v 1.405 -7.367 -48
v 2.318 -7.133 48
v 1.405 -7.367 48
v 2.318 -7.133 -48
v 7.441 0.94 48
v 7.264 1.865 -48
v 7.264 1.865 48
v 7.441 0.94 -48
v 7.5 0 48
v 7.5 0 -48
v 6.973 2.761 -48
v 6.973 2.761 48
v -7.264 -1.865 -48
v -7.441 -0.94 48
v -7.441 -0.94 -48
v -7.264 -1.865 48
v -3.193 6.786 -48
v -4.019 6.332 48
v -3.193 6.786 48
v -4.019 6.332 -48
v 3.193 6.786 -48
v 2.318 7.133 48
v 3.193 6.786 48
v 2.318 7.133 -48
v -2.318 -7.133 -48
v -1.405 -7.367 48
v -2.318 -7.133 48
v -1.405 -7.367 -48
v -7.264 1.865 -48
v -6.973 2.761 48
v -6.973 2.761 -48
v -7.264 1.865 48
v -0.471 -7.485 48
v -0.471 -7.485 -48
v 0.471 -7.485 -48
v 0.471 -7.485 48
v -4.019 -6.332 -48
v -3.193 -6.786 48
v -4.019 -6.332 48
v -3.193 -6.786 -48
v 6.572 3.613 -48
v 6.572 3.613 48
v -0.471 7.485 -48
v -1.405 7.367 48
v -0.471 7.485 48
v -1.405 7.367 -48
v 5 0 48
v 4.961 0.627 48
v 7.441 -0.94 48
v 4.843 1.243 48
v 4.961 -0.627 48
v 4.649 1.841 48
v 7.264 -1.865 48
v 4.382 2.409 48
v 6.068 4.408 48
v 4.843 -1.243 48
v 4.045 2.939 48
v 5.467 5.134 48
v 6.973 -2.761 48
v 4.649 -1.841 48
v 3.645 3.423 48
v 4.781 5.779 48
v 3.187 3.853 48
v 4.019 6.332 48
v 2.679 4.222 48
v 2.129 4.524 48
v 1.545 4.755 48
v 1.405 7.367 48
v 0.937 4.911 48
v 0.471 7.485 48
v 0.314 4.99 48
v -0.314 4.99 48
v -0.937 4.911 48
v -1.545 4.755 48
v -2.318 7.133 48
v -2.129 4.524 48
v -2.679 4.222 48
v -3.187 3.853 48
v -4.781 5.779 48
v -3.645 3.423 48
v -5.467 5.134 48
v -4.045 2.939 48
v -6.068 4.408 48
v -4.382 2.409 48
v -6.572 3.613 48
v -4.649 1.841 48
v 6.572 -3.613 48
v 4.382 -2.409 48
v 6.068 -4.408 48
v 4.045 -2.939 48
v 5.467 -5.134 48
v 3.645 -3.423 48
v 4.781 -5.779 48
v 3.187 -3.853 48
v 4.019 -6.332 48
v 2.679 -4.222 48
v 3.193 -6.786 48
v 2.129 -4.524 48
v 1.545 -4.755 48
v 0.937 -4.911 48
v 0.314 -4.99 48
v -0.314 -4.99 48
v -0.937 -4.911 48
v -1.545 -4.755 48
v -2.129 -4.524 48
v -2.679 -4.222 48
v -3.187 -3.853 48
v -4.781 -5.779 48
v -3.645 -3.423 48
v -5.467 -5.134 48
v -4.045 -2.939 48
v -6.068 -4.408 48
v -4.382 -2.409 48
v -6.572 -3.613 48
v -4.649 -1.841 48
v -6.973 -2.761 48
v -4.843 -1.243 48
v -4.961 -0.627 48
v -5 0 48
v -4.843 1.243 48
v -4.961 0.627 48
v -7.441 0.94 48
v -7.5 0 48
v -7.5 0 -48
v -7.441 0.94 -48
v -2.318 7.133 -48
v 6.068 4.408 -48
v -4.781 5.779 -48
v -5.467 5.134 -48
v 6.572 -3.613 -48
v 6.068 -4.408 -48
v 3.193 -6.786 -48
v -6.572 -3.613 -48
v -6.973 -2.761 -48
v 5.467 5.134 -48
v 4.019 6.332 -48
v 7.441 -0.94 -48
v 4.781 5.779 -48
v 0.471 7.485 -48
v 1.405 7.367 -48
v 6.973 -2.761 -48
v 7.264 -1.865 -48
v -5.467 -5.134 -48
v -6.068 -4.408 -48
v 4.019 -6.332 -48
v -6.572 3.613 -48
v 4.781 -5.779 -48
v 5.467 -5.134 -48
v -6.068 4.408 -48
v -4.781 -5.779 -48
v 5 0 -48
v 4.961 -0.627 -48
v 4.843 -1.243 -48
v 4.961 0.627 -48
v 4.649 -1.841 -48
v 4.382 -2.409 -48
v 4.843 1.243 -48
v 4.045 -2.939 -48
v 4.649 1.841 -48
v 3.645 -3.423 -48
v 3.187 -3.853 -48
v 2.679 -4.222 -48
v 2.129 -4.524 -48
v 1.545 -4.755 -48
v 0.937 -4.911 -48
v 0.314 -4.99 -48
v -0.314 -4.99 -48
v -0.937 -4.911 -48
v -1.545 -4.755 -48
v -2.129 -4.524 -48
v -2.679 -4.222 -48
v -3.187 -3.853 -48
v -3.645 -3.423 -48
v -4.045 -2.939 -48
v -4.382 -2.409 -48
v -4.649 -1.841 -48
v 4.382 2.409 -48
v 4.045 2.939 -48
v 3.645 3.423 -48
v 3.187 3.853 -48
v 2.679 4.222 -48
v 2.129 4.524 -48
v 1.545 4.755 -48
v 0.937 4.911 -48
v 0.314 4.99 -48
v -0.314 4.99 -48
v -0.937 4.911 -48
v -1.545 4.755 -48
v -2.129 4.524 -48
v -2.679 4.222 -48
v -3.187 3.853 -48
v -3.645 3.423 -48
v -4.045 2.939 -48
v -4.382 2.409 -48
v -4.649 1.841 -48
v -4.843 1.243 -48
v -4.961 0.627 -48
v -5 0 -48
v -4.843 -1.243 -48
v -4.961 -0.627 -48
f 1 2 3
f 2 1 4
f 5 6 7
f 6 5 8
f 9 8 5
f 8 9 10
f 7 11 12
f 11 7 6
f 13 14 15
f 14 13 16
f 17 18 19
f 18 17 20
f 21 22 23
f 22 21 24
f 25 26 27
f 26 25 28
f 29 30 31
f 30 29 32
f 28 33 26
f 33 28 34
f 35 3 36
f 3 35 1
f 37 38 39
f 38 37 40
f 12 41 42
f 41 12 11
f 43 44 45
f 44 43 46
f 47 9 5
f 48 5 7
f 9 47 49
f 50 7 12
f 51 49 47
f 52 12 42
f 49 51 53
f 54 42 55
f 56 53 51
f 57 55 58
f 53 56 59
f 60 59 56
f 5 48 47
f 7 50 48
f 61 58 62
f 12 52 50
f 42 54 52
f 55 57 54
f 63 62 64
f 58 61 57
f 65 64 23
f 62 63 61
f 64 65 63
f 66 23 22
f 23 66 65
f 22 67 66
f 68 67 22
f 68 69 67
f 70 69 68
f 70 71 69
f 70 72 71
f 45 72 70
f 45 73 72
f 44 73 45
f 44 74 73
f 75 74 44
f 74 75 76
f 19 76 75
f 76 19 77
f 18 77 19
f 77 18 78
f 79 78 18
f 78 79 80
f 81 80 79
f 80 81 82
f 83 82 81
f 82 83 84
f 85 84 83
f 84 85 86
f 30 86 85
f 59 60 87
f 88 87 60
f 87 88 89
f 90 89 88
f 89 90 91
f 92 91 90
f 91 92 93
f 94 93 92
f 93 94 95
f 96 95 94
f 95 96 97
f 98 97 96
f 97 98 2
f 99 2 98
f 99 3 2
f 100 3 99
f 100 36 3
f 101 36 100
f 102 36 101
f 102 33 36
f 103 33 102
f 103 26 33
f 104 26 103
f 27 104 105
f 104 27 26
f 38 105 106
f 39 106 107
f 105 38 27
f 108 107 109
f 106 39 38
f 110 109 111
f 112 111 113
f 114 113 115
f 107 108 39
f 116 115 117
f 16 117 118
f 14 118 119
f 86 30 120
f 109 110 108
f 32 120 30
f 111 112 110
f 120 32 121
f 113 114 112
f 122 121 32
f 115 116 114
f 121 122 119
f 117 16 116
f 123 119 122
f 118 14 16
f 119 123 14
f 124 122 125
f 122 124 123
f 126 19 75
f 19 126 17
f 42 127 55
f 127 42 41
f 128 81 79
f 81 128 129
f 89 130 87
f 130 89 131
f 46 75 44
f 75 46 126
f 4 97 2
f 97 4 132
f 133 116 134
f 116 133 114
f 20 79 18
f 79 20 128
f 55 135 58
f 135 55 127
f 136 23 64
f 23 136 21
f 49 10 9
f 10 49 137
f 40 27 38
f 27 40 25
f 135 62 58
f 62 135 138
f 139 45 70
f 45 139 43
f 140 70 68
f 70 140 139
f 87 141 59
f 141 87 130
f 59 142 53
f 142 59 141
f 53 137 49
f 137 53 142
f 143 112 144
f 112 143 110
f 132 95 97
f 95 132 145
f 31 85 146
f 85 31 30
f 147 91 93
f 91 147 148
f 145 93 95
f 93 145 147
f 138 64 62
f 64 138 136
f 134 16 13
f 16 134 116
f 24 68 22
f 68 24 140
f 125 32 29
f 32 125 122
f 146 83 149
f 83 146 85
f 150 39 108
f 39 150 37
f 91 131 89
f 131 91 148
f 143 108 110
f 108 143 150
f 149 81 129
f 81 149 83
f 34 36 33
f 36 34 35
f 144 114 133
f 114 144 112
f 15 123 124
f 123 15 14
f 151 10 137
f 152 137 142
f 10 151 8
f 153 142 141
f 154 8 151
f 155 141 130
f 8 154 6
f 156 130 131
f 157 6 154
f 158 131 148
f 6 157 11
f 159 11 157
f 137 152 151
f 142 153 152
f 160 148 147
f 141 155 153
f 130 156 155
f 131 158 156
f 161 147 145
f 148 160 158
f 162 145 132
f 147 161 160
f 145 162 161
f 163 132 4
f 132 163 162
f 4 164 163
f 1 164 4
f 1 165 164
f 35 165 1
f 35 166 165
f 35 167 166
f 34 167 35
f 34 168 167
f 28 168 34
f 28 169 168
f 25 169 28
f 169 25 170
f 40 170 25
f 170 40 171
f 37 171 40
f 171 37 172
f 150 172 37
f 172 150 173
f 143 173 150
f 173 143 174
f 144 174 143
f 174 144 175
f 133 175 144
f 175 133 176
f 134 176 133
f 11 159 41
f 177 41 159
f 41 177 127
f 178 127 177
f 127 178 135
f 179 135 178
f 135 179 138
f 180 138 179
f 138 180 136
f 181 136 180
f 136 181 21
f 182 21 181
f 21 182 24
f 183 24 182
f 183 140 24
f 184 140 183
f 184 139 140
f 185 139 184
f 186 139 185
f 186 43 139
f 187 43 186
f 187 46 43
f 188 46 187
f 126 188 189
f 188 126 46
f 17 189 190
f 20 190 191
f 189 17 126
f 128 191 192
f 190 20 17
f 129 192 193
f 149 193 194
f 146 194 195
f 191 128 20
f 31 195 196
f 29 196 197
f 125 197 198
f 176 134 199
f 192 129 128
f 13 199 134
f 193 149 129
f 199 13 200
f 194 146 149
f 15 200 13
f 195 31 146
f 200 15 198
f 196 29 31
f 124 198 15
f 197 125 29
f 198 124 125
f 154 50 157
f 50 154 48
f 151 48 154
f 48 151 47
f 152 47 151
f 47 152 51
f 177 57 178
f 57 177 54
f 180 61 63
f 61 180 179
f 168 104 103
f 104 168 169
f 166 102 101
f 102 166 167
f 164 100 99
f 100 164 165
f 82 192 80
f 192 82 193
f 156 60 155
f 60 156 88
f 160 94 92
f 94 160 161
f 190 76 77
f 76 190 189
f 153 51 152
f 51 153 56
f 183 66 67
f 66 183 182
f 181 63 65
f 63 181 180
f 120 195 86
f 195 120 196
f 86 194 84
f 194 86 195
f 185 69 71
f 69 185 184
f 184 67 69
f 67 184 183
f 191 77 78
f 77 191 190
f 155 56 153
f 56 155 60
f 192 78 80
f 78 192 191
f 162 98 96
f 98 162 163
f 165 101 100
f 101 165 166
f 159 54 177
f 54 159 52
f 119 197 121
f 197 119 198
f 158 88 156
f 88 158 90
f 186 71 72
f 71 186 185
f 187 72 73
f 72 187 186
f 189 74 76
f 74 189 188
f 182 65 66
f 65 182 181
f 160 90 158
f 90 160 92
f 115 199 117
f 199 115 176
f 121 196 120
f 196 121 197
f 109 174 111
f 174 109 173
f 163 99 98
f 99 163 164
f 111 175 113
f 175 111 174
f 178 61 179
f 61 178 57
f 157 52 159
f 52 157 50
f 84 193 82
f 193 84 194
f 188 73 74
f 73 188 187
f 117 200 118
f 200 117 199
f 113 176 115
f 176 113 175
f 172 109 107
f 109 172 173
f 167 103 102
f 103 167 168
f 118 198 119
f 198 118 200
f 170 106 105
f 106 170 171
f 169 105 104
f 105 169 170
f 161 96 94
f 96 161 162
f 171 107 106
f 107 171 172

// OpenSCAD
$fn = 50;


difference() {
	union() {
		translate(v = [0, 0, -48.0000000000]) {
			cylinder(h = 96, r = 7.5000000000);
		}
	}
	union() {
		translate(v = [0, 0, -100.0000000000]) {
			cylinder(h = 200, r = 5.0000000000);
		}
	}
}
